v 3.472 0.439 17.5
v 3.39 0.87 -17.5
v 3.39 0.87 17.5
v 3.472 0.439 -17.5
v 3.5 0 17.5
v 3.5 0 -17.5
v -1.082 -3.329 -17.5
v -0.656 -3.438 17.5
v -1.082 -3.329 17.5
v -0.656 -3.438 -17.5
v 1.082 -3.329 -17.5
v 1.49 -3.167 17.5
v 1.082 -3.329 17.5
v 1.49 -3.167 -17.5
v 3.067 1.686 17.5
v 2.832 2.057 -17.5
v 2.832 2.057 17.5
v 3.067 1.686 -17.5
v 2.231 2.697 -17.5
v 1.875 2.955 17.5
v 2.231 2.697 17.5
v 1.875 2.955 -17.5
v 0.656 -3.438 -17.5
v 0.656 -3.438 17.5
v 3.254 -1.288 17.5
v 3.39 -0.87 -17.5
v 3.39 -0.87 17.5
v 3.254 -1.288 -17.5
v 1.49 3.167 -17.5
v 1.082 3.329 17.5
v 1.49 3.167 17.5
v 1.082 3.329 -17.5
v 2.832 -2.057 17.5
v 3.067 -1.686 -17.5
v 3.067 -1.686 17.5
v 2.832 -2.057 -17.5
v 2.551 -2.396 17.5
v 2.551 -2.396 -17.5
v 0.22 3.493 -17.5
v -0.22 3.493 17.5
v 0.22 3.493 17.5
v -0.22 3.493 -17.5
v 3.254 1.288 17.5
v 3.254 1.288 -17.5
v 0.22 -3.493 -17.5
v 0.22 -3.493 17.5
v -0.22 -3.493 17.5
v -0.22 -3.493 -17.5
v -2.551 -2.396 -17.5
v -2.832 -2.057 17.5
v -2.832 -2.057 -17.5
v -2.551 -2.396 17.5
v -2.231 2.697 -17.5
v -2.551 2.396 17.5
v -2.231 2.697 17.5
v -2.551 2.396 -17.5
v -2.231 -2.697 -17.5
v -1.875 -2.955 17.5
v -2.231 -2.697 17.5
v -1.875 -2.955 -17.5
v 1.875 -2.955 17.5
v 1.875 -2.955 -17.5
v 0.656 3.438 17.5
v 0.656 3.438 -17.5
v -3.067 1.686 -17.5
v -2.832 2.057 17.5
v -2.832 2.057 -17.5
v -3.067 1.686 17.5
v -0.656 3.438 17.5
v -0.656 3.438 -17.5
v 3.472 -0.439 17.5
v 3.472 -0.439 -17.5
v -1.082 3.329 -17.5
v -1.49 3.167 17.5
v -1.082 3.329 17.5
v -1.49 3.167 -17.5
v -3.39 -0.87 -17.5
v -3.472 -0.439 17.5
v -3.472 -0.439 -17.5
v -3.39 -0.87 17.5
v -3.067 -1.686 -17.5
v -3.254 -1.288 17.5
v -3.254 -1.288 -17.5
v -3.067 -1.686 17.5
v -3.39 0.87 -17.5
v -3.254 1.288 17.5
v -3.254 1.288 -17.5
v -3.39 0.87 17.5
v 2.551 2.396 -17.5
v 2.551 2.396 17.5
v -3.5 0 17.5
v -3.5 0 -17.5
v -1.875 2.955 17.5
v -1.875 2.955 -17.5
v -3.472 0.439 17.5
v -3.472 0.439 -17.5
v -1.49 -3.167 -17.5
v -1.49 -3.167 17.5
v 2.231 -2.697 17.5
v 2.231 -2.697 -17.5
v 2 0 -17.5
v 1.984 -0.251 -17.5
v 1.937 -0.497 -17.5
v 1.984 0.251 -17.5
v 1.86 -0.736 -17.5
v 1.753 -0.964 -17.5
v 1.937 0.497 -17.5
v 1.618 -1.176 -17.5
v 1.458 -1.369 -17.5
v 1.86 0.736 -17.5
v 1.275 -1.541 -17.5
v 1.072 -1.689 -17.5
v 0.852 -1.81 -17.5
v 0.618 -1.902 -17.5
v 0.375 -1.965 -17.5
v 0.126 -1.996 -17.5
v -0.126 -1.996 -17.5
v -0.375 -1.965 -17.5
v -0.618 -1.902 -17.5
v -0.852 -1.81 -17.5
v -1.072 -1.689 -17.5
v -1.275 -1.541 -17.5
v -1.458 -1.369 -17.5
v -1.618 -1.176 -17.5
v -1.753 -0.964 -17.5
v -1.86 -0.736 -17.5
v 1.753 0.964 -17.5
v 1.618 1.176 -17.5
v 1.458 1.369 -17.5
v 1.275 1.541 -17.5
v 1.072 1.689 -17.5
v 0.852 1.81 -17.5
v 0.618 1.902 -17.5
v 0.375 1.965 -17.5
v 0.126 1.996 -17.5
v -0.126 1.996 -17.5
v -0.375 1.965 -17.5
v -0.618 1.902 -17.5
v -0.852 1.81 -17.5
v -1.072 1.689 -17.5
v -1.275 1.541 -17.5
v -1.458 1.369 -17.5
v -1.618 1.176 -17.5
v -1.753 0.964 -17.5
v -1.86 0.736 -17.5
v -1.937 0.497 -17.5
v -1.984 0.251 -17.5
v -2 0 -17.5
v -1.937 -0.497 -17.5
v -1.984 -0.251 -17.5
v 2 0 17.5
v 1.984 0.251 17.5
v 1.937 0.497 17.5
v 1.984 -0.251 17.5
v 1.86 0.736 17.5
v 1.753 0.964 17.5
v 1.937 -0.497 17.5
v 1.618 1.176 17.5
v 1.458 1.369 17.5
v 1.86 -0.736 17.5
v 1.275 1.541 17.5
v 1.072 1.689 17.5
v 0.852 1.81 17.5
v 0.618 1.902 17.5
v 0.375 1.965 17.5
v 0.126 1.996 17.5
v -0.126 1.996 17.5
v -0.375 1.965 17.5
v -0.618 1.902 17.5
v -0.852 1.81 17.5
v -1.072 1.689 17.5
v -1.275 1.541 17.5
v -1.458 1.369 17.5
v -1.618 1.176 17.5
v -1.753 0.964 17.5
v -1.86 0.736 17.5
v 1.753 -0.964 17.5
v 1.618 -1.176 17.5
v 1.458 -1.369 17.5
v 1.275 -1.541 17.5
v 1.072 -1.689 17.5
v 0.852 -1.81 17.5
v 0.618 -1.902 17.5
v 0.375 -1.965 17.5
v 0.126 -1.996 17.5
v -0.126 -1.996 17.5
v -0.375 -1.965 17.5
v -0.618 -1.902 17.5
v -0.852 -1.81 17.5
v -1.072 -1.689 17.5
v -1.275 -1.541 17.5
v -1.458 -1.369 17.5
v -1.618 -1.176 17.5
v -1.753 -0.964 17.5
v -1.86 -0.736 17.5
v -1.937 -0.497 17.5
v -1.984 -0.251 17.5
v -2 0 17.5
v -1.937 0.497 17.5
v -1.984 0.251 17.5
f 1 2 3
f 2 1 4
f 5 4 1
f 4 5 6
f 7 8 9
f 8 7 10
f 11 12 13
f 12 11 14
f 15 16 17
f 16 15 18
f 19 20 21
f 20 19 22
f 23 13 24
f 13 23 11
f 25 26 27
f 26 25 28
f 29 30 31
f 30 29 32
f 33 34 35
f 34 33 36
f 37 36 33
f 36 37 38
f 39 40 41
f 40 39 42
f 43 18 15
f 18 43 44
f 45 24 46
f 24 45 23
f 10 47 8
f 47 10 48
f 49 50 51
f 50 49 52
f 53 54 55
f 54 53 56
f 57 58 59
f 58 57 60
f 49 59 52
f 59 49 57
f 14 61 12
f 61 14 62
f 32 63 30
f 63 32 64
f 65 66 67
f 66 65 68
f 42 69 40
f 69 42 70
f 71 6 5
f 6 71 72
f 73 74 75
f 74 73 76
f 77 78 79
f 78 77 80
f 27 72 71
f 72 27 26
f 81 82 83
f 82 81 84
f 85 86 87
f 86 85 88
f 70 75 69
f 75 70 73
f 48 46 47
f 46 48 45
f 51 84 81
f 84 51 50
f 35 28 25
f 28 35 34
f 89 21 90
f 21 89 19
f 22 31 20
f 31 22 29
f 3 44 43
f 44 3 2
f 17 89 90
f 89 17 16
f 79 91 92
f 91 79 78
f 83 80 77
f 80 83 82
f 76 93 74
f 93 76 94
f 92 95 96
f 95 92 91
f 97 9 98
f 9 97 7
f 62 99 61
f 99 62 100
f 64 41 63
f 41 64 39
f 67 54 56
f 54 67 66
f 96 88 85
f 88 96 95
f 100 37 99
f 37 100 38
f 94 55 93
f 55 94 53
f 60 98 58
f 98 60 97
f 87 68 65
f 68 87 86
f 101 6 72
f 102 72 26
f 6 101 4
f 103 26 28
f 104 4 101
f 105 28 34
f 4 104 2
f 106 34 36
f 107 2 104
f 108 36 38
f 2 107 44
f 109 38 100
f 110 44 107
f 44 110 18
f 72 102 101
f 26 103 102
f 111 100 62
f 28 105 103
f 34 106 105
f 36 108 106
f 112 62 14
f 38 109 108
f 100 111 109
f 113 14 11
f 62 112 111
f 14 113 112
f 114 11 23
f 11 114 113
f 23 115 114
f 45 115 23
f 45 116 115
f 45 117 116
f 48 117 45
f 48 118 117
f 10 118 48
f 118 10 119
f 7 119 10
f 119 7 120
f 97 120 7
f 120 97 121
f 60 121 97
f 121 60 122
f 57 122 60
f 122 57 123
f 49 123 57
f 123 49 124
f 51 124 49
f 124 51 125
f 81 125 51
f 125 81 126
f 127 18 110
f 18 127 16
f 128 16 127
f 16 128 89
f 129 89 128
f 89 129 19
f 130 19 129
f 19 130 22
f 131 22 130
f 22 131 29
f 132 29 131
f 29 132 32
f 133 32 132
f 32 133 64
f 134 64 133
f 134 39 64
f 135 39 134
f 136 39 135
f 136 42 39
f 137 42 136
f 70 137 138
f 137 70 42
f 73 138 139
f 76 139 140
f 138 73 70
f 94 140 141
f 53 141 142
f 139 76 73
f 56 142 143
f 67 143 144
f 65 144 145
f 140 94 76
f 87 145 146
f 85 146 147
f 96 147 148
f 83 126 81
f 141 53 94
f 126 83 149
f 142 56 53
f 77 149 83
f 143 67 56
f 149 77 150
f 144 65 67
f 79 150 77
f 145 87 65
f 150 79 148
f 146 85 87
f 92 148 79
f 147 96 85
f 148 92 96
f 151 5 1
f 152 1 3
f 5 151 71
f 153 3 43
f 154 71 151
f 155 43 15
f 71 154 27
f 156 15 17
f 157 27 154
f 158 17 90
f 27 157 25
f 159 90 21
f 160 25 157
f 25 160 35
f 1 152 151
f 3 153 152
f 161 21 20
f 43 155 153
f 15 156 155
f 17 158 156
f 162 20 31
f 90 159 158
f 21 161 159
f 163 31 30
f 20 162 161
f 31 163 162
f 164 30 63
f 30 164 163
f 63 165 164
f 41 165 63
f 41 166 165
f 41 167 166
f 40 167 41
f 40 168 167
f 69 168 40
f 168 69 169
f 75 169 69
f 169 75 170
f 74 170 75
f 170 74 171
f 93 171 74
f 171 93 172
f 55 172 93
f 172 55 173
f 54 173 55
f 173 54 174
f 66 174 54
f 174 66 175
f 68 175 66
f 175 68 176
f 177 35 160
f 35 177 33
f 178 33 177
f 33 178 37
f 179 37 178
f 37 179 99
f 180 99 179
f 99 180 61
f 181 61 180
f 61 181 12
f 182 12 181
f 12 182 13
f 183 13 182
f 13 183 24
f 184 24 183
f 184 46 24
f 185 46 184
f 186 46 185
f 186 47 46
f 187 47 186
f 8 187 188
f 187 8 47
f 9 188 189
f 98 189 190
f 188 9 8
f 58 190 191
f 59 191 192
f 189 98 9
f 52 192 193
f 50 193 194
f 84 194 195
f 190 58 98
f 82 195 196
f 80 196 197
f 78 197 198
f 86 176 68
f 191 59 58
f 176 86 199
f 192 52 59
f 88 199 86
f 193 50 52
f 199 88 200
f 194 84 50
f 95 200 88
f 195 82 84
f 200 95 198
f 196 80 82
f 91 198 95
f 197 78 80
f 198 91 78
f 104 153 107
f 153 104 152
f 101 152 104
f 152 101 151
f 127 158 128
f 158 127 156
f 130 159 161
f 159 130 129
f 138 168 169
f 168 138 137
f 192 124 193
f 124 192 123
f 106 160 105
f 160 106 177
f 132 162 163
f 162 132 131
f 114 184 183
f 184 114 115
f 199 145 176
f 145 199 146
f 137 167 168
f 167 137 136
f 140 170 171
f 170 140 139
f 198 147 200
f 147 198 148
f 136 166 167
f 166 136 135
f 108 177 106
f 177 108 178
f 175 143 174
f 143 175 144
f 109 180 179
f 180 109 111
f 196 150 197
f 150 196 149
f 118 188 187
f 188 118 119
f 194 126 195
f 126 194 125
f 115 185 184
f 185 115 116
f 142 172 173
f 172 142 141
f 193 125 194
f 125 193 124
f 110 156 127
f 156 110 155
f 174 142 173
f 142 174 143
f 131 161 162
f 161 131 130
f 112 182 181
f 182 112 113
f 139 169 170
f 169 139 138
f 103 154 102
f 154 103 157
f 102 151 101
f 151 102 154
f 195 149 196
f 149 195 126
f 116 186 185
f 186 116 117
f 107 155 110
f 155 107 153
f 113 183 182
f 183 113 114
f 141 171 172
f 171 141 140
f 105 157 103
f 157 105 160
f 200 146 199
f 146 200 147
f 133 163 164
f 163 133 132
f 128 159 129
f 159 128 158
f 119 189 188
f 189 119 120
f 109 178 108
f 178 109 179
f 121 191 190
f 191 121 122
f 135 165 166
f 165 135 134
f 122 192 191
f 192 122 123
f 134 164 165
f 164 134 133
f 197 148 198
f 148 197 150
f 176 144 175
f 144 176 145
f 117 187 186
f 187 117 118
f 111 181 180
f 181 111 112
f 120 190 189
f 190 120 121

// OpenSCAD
$fn = 50;


difference() {
	union() {
		translate(v = [0, 0, -17.5000000000]) {
			cylinder(h = 35, r = 3.5000000000);
		}
	}
	union() {
		translate(v = [0, 0, -100.0000000000]) {
			cylinder(h = 200, r = 2.0000000000);
		}
	}
}
